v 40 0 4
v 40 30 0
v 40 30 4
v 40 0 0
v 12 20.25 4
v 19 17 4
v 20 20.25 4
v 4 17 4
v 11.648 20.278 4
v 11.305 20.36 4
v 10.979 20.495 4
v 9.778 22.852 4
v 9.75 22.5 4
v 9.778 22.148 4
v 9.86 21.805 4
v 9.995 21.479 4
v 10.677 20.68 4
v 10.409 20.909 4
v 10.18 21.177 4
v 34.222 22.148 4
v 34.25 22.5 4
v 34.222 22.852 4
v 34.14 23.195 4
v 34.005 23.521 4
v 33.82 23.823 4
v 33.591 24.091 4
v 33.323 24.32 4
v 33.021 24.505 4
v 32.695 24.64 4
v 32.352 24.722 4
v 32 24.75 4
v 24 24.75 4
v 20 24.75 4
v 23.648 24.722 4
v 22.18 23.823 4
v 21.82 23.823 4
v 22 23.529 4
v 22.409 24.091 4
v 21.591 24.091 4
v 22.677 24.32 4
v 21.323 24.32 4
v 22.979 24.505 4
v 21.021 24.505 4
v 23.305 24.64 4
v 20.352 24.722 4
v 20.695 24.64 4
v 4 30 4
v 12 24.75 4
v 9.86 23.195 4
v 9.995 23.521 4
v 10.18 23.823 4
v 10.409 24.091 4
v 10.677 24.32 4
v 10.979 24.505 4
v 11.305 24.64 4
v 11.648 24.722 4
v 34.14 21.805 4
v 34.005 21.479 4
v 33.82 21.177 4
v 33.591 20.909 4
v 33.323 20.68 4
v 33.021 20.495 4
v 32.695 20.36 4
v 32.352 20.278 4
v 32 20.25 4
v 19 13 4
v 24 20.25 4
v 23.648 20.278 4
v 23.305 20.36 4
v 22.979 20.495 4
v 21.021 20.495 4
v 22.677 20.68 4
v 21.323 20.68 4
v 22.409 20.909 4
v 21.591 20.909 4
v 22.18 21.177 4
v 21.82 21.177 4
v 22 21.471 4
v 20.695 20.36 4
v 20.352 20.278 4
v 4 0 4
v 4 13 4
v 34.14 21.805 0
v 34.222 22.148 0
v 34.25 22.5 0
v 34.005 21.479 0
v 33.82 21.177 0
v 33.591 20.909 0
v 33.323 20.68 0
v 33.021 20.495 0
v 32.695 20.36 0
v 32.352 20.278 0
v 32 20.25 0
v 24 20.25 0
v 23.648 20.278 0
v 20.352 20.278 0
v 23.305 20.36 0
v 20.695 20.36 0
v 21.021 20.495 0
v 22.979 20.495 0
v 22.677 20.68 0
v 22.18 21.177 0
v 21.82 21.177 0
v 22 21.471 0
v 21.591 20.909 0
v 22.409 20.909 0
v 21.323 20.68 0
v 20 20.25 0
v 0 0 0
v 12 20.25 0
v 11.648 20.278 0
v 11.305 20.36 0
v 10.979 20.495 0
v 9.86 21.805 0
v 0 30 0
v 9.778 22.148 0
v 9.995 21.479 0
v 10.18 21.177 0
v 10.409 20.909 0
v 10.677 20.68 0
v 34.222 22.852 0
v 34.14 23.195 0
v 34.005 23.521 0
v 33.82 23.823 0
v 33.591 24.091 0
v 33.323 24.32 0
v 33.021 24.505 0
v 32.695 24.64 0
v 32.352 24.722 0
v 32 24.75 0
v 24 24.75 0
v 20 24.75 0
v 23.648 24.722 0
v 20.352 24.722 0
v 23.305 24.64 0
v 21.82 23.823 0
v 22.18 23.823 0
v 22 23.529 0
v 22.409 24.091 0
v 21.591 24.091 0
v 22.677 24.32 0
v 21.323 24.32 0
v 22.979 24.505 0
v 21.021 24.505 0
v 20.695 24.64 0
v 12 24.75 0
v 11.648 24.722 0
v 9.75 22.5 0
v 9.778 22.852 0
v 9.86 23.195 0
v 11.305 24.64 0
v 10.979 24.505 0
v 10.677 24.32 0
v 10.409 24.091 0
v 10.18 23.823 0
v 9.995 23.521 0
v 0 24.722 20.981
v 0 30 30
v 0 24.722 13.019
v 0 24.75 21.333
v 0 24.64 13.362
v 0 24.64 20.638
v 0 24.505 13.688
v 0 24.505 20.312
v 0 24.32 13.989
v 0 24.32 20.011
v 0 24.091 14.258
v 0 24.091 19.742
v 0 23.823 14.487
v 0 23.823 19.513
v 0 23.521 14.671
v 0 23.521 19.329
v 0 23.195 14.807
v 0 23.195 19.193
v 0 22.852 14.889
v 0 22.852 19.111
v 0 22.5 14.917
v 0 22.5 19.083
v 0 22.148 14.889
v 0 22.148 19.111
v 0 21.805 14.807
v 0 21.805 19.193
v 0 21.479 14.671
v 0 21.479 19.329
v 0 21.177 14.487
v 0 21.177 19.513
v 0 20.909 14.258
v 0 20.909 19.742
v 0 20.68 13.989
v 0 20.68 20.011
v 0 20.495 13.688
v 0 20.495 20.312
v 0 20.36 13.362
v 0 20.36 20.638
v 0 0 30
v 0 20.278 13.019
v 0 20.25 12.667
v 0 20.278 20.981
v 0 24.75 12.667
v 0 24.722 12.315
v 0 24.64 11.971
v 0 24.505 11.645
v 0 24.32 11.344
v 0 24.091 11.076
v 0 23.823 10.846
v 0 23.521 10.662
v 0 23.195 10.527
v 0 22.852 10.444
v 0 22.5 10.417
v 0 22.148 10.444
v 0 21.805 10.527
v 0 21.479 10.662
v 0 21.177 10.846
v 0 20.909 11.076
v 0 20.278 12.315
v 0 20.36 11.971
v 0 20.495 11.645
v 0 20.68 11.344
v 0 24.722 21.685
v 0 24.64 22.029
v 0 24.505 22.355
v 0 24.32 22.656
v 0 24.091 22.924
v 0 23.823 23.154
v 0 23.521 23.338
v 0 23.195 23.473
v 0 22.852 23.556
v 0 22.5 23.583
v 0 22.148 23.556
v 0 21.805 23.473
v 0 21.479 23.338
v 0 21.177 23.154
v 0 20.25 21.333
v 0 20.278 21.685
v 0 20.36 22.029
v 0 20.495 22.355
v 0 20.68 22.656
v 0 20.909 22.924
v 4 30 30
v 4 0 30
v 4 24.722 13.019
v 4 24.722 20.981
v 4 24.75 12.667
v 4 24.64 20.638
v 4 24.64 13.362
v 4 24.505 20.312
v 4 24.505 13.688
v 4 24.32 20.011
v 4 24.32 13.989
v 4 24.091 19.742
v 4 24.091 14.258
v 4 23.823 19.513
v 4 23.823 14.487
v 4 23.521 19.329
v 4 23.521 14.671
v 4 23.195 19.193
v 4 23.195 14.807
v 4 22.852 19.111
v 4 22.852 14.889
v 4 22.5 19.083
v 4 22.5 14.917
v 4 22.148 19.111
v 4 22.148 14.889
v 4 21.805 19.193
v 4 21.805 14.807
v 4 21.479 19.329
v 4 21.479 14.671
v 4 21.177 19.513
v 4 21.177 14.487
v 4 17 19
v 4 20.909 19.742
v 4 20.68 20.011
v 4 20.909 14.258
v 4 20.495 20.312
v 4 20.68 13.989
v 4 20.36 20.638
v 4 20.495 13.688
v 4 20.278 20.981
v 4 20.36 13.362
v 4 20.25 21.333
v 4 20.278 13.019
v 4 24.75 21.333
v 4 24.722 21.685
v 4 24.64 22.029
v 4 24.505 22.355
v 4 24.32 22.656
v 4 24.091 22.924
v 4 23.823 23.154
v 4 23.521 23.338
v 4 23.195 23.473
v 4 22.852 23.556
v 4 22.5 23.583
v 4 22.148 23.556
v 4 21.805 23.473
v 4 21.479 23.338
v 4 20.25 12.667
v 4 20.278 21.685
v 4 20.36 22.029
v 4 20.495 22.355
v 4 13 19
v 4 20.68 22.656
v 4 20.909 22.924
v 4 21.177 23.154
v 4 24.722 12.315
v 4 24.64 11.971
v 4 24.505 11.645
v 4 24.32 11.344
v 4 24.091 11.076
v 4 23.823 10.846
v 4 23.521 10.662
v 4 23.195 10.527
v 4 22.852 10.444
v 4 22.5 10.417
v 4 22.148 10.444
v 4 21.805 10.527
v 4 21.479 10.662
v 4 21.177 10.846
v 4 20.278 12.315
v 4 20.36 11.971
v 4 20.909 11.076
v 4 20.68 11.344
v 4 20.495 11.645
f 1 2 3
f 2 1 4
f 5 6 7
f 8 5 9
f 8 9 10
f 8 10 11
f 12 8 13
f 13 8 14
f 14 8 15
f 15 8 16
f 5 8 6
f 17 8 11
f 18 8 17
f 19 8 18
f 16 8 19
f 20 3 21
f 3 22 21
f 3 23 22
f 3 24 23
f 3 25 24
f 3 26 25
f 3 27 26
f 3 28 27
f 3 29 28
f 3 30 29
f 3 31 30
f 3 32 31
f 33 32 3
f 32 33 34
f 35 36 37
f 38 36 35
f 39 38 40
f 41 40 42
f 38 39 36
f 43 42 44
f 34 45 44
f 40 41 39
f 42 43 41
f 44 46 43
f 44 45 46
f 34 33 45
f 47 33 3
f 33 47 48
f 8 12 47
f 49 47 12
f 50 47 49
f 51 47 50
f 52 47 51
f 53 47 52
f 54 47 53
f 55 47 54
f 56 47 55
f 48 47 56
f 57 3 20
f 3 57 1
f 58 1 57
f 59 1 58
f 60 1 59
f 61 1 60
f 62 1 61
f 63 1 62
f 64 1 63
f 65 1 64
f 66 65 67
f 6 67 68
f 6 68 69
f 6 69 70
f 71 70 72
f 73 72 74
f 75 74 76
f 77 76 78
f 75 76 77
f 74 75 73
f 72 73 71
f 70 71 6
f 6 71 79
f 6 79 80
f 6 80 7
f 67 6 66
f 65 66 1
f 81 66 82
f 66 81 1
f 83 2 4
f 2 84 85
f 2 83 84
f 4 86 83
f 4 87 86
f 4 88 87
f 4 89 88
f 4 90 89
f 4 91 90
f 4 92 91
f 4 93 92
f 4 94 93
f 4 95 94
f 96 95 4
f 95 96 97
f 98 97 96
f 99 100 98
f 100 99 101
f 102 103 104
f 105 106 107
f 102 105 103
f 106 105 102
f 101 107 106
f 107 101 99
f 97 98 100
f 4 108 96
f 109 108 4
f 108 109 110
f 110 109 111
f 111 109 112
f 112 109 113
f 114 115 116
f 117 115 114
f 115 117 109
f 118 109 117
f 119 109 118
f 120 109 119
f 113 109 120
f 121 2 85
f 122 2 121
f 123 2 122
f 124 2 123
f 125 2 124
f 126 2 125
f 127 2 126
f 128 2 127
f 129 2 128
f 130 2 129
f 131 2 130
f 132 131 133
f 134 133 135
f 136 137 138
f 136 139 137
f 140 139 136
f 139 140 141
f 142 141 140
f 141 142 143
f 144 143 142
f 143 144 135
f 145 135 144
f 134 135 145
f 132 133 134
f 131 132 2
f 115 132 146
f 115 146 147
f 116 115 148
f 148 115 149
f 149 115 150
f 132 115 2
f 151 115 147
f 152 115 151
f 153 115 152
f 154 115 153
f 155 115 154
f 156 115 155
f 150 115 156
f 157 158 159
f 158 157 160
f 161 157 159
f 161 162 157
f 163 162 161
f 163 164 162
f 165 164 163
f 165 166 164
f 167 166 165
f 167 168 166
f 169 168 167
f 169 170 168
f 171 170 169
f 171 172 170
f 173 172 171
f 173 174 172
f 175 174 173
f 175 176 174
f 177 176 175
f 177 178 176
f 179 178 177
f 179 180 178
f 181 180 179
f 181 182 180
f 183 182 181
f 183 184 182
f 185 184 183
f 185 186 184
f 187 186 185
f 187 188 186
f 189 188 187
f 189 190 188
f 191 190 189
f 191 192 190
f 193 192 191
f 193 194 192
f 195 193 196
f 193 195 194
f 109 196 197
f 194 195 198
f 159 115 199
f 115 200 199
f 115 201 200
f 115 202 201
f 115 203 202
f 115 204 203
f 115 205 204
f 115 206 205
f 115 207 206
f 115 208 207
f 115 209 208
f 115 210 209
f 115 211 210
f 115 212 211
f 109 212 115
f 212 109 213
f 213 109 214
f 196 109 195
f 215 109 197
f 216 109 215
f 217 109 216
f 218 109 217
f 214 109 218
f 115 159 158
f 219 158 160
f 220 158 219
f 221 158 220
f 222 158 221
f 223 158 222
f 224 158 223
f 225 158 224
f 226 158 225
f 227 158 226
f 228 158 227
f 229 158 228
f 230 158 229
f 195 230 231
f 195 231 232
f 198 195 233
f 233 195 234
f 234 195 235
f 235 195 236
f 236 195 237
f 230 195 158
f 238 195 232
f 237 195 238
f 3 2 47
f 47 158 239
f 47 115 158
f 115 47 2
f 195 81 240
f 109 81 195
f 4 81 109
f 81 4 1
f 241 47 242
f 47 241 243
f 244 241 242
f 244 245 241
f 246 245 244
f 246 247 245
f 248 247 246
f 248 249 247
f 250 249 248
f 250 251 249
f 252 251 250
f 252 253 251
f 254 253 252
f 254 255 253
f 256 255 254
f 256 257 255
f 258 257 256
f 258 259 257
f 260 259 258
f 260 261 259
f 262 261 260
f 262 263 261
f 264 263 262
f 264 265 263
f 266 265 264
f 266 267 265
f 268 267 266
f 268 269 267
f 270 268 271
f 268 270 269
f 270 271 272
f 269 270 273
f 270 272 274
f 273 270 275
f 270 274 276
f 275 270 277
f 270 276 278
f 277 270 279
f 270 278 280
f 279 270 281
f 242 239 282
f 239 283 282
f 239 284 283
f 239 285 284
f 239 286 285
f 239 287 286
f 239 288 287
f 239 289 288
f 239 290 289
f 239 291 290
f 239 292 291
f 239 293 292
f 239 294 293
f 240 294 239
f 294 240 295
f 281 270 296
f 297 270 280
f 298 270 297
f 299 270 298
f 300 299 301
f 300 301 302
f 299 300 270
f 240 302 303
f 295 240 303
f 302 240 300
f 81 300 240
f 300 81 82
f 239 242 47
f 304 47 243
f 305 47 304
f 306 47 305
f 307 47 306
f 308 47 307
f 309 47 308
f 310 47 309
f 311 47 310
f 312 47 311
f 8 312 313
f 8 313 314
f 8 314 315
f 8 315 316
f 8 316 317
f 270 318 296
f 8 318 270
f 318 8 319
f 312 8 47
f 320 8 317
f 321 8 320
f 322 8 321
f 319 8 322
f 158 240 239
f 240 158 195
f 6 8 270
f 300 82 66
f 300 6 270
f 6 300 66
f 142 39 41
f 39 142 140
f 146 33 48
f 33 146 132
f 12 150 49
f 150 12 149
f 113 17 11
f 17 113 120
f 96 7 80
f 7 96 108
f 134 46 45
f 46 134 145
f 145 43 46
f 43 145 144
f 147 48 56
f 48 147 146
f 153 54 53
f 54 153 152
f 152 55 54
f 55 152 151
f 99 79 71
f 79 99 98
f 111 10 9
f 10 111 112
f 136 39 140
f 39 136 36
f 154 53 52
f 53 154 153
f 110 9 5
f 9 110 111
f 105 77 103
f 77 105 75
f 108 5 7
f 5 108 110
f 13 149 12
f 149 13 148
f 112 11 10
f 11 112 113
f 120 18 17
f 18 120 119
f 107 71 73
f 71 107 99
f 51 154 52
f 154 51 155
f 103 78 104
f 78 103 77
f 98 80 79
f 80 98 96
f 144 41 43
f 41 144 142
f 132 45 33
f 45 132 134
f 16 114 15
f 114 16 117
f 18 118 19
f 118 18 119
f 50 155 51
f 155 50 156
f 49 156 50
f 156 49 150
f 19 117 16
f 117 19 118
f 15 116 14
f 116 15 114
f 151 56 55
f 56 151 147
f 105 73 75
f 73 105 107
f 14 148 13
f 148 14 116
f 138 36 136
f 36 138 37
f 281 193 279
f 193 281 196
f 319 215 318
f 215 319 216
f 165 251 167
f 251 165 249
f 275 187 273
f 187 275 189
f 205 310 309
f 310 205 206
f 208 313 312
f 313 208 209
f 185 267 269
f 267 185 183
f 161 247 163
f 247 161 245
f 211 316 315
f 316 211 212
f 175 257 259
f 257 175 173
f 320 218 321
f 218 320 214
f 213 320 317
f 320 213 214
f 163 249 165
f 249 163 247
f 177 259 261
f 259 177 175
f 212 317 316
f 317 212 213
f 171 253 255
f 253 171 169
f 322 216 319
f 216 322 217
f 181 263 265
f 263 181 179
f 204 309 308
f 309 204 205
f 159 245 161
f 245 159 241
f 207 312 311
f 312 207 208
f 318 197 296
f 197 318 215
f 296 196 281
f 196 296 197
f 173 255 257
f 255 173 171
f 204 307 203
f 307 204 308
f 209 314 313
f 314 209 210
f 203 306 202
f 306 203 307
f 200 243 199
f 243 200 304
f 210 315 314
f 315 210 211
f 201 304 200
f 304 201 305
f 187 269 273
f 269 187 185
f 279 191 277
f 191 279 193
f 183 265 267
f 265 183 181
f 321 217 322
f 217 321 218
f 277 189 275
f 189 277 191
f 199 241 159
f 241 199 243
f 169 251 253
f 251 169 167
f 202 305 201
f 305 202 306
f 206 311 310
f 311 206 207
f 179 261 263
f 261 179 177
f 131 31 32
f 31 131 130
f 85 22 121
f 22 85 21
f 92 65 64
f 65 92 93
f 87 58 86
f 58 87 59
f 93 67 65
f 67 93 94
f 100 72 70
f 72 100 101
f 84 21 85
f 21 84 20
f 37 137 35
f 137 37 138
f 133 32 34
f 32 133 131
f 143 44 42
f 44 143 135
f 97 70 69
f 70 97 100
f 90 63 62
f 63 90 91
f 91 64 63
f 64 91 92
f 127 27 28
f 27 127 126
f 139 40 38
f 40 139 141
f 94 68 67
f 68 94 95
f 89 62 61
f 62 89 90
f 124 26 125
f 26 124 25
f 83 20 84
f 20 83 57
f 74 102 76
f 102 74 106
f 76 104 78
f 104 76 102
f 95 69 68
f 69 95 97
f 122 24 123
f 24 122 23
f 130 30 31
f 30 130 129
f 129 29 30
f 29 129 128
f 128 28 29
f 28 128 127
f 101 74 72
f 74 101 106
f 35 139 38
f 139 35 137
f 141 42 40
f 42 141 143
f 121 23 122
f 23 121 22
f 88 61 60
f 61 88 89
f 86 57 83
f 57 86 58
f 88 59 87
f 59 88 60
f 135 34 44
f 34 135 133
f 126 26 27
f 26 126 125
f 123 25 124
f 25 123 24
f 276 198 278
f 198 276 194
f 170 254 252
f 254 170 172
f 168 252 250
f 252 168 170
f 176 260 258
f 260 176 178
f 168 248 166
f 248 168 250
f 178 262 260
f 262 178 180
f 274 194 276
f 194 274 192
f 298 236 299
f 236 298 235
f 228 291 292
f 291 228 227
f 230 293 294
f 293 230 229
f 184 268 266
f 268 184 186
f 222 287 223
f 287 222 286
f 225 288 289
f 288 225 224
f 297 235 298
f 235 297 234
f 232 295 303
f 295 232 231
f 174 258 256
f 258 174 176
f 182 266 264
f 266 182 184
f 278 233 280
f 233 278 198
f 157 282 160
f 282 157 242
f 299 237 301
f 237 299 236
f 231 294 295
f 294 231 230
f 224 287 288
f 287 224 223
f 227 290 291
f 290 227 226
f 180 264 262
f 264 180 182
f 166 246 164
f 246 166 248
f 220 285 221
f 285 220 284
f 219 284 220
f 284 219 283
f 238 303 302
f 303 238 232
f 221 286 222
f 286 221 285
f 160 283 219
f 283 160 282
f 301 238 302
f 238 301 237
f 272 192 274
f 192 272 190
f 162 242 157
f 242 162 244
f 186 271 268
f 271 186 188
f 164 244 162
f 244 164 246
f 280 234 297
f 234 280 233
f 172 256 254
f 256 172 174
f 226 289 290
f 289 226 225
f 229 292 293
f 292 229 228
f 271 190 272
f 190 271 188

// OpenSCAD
// L bracket with slots, holes and a gusset. Tests overhangs, holes and bridges.

/* [Size] */
width = 30; // [10:1:100]
leg_a = 40; // [10:1:120]
leg_b = 30; // [10:1:120]
thickness = 4; // [1.5:0.5:10]

/* [Holes] */
hole = 4.5; // [2:0.1:10]
holes_per_leg = 2; // [1:1:4]
slots = true;
slot_length = 8; // [2:1:30]

/* [Gusset] */
gusset = true;
gusset_size = 15; // [4:1:60]

/* [Hidden] */
$fn = 40;

module slot(len) {
    hull() for (x = [0, slots ? len : 0]) translate([x, 0, 0]) cylinder(d = hole, h = thickness * 3, center = true);
}

difference() {
    union() {
        cube([leg_a, width, thickness]);
        cube([thickness, width, leg_b]);
        if (gusset)
            translate([thickness, width / 2 + thickness / 2, thickness]) rotate([90, 0, 0])
                linear_extrude(thickness) polygon([[0, 0], [gusset_size, 0], [0, gusset_size]]);
    }
    for (i = [1 : holes_per_leg]) {
        translate([thickness + (leg_a - thickness) * i / (holes_per_leg + 1) - slot_length / 2, width / 2 + (gusset ? width / 4 : 0), 0])
            slot(slot_length);
        translate([0, width / 2 + (gusset ? width / 4 : 0), thickness + (leg_b - thickness) * i / (holes_per_leg + 1)])
            rotate([0, 90, 0]) cylinder(d = hole, h = thickness * 3, center = true);
    }
}
